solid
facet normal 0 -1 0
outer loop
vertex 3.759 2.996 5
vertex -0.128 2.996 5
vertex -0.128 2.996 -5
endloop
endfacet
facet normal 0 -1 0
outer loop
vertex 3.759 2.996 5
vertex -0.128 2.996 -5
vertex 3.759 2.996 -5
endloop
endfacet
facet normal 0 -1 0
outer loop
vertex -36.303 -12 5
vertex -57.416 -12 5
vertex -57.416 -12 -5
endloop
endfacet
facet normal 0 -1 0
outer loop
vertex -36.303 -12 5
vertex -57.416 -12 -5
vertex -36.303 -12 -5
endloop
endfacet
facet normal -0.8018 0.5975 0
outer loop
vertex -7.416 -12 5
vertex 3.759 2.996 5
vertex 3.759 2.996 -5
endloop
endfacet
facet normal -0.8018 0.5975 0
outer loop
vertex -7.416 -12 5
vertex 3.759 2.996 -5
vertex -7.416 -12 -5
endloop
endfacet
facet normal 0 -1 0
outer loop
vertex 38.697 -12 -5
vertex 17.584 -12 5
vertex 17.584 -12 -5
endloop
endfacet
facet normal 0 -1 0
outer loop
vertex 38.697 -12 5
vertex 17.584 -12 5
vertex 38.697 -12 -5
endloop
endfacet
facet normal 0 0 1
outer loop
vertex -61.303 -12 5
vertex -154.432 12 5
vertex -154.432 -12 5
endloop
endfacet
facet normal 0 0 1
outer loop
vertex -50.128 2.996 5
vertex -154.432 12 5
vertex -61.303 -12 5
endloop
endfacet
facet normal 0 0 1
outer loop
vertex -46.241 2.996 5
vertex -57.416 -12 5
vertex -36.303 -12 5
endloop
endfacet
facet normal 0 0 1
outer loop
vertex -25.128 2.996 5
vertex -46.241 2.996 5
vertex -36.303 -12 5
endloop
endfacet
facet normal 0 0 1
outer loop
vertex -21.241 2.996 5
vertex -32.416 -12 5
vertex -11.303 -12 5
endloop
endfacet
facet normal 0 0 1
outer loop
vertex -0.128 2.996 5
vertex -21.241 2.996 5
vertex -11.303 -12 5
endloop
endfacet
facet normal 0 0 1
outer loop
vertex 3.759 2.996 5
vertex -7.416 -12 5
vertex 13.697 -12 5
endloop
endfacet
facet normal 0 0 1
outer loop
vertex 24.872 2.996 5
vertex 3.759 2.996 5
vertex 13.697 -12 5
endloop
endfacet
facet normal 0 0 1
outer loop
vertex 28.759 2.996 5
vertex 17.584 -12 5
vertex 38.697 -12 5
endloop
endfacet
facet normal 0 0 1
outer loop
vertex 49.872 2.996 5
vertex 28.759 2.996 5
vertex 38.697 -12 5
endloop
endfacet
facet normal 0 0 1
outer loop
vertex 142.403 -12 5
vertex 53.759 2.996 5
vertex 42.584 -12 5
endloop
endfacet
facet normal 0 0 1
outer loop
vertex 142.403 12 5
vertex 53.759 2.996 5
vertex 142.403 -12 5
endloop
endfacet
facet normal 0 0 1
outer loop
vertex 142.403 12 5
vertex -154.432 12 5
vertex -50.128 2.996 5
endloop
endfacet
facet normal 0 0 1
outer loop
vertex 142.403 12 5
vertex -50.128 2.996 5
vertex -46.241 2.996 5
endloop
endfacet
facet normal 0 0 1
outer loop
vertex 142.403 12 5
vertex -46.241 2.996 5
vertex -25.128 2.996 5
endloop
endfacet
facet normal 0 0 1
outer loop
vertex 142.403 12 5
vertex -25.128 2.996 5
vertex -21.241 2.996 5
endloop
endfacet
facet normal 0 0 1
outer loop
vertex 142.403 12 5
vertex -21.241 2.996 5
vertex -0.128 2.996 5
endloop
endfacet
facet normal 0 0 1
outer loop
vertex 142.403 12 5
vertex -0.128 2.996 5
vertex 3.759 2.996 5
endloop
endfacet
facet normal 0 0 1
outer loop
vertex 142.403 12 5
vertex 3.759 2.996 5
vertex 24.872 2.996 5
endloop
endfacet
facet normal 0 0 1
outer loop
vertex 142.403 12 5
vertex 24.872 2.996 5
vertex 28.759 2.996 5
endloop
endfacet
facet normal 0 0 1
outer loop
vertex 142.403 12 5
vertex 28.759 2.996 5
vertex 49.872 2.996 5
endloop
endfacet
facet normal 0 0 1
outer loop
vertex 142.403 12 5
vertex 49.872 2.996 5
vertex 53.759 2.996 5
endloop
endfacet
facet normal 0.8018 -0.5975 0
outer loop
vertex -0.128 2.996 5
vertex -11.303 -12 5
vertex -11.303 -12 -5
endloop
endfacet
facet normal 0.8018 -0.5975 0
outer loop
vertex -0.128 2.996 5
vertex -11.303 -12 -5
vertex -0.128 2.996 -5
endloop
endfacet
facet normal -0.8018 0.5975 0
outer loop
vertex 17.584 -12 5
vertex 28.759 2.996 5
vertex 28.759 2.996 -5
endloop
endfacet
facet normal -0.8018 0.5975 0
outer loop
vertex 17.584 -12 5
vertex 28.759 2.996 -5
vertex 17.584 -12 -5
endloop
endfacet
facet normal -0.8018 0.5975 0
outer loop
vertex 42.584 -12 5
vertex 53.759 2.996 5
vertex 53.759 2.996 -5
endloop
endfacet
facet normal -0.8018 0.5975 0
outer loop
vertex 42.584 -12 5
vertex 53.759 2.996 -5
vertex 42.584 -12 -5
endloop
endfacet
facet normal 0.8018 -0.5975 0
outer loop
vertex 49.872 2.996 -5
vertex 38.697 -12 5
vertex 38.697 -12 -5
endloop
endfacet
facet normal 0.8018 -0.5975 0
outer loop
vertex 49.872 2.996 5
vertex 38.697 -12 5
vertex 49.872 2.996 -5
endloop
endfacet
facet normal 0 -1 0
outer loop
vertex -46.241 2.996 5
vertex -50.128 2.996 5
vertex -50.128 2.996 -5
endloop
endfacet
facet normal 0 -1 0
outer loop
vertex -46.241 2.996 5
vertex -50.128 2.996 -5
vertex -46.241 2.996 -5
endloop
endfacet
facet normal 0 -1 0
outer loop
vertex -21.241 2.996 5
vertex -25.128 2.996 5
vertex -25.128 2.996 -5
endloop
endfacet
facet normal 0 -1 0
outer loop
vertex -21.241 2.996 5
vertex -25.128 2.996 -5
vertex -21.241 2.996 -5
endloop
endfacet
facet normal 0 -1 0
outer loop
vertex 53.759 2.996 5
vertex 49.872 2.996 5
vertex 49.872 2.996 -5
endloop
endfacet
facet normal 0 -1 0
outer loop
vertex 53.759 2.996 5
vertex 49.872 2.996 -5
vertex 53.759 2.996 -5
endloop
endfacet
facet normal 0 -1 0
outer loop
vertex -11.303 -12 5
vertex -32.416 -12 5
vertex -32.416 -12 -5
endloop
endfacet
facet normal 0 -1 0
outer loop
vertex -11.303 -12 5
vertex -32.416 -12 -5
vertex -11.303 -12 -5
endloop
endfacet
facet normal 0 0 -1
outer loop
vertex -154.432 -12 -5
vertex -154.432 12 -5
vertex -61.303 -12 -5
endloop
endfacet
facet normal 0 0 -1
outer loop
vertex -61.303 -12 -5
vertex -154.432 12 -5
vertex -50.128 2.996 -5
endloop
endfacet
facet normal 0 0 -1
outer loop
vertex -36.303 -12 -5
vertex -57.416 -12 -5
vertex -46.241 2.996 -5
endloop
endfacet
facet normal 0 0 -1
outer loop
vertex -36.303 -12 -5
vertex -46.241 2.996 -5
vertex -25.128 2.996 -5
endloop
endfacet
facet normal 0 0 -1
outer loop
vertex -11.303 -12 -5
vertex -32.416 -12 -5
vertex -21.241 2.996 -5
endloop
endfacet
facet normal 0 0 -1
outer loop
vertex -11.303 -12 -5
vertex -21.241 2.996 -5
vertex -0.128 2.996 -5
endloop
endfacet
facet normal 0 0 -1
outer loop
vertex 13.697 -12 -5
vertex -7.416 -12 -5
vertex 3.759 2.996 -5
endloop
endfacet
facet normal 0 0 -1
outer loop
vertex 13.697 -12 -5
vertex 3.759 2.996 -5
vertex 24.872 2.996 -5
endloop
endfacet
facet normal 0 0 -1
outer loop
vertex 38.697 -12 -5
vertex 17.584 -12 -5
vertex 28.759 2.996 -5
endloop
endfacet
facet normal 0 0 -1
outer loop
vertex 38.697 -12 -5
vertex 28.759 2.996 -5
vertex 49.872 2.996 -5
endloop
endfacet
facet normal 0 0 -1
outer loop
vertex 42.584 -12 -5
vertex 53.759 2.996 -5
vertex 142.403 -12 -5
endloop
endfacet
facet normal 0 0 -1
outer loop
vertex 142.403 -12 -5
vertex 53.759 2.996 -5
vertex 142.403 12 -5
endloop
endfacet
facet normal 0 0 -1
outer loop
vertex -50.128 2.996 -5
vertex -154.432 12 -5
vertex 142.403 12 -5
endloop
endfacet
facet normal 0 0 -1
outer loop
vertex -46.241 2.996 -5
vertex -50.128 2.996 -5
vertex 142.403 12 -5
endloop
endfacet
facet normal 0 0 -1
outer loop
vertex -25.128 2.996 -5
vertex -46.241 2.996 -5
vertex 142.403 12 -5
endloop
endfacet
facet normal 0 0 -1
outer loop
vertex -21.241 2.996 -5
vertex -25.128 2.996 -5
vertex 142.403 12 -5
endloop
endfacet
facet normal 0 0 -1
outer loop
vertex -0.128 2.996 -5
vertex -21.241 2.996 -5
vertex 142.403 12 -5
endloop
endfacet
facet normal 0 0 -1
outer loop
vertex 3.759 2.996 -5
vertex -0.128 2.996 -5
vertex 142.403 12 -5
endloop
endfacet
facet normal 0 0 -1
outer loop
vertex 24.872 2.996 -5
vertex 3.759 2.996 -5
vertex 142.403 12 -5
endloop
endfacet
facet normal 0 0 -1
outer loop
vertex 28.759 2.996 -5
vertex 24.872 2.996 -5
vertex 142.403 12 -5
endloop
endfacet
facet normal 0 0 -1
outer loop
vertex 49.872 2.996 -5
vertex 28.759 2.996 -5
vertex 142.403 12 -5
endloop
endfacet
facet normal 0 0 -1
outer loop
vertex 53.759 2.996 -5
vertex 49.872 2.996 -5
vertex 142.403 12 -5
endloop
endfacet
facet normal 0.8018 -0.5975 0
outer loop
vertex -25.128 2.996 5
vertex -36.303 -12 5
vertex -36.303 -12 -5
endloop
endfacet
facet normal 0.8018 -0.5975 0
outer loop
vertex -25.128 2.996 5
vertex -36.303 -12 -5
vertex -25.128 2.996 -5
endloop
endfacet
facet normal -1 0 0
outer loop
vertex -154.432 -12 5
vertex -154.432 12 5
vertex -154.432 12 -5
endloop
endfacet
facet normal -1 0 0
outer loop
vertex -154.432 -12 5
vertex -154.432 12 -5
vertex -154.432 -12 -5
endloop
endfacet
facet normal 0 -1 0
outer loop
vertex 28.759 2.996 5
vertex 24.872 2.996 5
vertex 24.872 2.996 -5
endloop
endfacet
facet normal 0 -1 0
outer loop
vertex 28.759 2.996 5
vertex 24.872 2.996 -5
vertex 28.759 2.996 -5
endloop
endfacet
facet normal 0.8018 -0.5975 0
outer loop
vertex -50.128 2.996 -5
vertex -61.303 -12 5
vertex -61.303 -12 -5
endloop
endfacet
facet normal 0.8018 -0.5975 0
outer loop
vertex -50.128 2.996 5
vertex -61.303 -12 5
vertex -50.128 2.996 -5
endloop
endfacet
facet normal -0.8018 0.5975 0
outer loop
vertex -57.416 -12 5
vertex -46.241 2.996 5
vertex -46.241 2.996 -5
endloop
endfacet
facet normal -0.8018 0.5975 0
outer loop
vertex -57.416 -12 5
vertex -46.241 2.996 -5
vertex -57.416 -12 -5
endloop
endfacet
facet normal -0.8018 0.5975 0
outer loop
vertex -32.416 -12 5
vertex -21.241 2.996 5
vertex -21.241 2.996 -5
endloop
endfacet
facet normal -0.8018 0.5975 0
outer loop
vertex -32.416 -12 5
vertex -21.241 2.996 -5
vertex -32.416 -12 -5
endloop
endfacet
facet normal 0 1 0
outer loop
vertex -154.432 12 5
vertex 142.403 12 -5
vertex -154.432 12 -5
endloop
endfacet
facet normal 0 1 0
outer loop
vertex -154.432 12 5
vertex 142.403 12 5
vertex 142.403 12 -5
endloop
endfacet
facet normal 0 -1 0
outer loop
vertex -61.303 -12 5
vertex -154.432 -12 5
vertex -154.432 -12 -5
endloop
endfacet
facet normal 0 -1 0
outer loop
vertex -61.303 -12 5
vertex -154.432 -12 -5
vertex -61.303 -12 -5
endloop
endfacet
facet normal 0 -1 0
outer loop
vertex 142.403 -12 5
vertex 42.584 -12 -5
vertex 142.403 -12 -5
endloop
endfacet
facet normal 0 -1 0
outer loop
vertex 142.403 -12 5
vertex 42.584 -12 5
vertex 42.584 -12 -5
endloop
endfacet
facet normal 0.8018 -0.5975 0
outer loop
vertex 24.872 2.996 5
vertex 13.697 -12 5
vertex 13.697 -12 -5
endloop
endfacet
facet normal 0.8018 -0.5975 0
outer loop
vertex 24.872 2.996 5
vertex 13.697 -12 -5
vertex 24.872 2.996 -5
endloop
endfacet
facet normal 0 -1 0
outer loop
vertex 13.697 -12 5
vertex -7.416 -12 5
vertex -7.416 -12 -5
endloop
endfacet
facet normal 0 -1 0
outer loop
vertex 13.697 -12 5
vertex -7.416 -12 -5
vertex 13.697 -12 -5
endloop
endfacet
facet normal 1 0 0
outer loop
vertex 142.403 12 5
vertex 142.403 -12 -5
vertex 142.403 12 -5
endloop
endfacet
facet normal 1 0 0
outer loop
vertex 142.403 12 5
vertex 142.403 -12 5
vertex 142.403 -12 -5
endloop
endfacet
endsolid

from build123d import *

# Parameters (mm, degrees)
F1_DEPTH      = 5
F1_DEPTH_BACK = 5


with BuildPart() as f1:
    # F0 (on Top) → F1 (new body, two sides)
    with BuildSketch(Plane.XY) as f1_sk:
        Polygon((142.402977, 12), (-154.432267, 12), (-154.432267, -12), (-61.303213, -12), (-50.127726, 2.996326), (-46.240598, 2.996326), (-57.416085, -12), (-36.303213, -12), (-25.127726, 2.996326), (-21.240598, 2.996326), (-32.416085, -12), (-11.303213, -12), (-0.127726, 2.996326), (3.759402, 2.996326), (-7.416085, -12), (13.696787, -12), (24.872274, 2.996326), (28.759402, 2.996326), (17.583915, -12), (38.696787, -12), (49.872274, 2.996326), (53.759402, 2.996326), (42.583915, -12), (142.402977, -12), align=None)
    extrude(amount=F1_DEPTH)
    extrude(f1_sk.sketch, amount=-F1_DEPTH_BACK)


solid = f1.part
